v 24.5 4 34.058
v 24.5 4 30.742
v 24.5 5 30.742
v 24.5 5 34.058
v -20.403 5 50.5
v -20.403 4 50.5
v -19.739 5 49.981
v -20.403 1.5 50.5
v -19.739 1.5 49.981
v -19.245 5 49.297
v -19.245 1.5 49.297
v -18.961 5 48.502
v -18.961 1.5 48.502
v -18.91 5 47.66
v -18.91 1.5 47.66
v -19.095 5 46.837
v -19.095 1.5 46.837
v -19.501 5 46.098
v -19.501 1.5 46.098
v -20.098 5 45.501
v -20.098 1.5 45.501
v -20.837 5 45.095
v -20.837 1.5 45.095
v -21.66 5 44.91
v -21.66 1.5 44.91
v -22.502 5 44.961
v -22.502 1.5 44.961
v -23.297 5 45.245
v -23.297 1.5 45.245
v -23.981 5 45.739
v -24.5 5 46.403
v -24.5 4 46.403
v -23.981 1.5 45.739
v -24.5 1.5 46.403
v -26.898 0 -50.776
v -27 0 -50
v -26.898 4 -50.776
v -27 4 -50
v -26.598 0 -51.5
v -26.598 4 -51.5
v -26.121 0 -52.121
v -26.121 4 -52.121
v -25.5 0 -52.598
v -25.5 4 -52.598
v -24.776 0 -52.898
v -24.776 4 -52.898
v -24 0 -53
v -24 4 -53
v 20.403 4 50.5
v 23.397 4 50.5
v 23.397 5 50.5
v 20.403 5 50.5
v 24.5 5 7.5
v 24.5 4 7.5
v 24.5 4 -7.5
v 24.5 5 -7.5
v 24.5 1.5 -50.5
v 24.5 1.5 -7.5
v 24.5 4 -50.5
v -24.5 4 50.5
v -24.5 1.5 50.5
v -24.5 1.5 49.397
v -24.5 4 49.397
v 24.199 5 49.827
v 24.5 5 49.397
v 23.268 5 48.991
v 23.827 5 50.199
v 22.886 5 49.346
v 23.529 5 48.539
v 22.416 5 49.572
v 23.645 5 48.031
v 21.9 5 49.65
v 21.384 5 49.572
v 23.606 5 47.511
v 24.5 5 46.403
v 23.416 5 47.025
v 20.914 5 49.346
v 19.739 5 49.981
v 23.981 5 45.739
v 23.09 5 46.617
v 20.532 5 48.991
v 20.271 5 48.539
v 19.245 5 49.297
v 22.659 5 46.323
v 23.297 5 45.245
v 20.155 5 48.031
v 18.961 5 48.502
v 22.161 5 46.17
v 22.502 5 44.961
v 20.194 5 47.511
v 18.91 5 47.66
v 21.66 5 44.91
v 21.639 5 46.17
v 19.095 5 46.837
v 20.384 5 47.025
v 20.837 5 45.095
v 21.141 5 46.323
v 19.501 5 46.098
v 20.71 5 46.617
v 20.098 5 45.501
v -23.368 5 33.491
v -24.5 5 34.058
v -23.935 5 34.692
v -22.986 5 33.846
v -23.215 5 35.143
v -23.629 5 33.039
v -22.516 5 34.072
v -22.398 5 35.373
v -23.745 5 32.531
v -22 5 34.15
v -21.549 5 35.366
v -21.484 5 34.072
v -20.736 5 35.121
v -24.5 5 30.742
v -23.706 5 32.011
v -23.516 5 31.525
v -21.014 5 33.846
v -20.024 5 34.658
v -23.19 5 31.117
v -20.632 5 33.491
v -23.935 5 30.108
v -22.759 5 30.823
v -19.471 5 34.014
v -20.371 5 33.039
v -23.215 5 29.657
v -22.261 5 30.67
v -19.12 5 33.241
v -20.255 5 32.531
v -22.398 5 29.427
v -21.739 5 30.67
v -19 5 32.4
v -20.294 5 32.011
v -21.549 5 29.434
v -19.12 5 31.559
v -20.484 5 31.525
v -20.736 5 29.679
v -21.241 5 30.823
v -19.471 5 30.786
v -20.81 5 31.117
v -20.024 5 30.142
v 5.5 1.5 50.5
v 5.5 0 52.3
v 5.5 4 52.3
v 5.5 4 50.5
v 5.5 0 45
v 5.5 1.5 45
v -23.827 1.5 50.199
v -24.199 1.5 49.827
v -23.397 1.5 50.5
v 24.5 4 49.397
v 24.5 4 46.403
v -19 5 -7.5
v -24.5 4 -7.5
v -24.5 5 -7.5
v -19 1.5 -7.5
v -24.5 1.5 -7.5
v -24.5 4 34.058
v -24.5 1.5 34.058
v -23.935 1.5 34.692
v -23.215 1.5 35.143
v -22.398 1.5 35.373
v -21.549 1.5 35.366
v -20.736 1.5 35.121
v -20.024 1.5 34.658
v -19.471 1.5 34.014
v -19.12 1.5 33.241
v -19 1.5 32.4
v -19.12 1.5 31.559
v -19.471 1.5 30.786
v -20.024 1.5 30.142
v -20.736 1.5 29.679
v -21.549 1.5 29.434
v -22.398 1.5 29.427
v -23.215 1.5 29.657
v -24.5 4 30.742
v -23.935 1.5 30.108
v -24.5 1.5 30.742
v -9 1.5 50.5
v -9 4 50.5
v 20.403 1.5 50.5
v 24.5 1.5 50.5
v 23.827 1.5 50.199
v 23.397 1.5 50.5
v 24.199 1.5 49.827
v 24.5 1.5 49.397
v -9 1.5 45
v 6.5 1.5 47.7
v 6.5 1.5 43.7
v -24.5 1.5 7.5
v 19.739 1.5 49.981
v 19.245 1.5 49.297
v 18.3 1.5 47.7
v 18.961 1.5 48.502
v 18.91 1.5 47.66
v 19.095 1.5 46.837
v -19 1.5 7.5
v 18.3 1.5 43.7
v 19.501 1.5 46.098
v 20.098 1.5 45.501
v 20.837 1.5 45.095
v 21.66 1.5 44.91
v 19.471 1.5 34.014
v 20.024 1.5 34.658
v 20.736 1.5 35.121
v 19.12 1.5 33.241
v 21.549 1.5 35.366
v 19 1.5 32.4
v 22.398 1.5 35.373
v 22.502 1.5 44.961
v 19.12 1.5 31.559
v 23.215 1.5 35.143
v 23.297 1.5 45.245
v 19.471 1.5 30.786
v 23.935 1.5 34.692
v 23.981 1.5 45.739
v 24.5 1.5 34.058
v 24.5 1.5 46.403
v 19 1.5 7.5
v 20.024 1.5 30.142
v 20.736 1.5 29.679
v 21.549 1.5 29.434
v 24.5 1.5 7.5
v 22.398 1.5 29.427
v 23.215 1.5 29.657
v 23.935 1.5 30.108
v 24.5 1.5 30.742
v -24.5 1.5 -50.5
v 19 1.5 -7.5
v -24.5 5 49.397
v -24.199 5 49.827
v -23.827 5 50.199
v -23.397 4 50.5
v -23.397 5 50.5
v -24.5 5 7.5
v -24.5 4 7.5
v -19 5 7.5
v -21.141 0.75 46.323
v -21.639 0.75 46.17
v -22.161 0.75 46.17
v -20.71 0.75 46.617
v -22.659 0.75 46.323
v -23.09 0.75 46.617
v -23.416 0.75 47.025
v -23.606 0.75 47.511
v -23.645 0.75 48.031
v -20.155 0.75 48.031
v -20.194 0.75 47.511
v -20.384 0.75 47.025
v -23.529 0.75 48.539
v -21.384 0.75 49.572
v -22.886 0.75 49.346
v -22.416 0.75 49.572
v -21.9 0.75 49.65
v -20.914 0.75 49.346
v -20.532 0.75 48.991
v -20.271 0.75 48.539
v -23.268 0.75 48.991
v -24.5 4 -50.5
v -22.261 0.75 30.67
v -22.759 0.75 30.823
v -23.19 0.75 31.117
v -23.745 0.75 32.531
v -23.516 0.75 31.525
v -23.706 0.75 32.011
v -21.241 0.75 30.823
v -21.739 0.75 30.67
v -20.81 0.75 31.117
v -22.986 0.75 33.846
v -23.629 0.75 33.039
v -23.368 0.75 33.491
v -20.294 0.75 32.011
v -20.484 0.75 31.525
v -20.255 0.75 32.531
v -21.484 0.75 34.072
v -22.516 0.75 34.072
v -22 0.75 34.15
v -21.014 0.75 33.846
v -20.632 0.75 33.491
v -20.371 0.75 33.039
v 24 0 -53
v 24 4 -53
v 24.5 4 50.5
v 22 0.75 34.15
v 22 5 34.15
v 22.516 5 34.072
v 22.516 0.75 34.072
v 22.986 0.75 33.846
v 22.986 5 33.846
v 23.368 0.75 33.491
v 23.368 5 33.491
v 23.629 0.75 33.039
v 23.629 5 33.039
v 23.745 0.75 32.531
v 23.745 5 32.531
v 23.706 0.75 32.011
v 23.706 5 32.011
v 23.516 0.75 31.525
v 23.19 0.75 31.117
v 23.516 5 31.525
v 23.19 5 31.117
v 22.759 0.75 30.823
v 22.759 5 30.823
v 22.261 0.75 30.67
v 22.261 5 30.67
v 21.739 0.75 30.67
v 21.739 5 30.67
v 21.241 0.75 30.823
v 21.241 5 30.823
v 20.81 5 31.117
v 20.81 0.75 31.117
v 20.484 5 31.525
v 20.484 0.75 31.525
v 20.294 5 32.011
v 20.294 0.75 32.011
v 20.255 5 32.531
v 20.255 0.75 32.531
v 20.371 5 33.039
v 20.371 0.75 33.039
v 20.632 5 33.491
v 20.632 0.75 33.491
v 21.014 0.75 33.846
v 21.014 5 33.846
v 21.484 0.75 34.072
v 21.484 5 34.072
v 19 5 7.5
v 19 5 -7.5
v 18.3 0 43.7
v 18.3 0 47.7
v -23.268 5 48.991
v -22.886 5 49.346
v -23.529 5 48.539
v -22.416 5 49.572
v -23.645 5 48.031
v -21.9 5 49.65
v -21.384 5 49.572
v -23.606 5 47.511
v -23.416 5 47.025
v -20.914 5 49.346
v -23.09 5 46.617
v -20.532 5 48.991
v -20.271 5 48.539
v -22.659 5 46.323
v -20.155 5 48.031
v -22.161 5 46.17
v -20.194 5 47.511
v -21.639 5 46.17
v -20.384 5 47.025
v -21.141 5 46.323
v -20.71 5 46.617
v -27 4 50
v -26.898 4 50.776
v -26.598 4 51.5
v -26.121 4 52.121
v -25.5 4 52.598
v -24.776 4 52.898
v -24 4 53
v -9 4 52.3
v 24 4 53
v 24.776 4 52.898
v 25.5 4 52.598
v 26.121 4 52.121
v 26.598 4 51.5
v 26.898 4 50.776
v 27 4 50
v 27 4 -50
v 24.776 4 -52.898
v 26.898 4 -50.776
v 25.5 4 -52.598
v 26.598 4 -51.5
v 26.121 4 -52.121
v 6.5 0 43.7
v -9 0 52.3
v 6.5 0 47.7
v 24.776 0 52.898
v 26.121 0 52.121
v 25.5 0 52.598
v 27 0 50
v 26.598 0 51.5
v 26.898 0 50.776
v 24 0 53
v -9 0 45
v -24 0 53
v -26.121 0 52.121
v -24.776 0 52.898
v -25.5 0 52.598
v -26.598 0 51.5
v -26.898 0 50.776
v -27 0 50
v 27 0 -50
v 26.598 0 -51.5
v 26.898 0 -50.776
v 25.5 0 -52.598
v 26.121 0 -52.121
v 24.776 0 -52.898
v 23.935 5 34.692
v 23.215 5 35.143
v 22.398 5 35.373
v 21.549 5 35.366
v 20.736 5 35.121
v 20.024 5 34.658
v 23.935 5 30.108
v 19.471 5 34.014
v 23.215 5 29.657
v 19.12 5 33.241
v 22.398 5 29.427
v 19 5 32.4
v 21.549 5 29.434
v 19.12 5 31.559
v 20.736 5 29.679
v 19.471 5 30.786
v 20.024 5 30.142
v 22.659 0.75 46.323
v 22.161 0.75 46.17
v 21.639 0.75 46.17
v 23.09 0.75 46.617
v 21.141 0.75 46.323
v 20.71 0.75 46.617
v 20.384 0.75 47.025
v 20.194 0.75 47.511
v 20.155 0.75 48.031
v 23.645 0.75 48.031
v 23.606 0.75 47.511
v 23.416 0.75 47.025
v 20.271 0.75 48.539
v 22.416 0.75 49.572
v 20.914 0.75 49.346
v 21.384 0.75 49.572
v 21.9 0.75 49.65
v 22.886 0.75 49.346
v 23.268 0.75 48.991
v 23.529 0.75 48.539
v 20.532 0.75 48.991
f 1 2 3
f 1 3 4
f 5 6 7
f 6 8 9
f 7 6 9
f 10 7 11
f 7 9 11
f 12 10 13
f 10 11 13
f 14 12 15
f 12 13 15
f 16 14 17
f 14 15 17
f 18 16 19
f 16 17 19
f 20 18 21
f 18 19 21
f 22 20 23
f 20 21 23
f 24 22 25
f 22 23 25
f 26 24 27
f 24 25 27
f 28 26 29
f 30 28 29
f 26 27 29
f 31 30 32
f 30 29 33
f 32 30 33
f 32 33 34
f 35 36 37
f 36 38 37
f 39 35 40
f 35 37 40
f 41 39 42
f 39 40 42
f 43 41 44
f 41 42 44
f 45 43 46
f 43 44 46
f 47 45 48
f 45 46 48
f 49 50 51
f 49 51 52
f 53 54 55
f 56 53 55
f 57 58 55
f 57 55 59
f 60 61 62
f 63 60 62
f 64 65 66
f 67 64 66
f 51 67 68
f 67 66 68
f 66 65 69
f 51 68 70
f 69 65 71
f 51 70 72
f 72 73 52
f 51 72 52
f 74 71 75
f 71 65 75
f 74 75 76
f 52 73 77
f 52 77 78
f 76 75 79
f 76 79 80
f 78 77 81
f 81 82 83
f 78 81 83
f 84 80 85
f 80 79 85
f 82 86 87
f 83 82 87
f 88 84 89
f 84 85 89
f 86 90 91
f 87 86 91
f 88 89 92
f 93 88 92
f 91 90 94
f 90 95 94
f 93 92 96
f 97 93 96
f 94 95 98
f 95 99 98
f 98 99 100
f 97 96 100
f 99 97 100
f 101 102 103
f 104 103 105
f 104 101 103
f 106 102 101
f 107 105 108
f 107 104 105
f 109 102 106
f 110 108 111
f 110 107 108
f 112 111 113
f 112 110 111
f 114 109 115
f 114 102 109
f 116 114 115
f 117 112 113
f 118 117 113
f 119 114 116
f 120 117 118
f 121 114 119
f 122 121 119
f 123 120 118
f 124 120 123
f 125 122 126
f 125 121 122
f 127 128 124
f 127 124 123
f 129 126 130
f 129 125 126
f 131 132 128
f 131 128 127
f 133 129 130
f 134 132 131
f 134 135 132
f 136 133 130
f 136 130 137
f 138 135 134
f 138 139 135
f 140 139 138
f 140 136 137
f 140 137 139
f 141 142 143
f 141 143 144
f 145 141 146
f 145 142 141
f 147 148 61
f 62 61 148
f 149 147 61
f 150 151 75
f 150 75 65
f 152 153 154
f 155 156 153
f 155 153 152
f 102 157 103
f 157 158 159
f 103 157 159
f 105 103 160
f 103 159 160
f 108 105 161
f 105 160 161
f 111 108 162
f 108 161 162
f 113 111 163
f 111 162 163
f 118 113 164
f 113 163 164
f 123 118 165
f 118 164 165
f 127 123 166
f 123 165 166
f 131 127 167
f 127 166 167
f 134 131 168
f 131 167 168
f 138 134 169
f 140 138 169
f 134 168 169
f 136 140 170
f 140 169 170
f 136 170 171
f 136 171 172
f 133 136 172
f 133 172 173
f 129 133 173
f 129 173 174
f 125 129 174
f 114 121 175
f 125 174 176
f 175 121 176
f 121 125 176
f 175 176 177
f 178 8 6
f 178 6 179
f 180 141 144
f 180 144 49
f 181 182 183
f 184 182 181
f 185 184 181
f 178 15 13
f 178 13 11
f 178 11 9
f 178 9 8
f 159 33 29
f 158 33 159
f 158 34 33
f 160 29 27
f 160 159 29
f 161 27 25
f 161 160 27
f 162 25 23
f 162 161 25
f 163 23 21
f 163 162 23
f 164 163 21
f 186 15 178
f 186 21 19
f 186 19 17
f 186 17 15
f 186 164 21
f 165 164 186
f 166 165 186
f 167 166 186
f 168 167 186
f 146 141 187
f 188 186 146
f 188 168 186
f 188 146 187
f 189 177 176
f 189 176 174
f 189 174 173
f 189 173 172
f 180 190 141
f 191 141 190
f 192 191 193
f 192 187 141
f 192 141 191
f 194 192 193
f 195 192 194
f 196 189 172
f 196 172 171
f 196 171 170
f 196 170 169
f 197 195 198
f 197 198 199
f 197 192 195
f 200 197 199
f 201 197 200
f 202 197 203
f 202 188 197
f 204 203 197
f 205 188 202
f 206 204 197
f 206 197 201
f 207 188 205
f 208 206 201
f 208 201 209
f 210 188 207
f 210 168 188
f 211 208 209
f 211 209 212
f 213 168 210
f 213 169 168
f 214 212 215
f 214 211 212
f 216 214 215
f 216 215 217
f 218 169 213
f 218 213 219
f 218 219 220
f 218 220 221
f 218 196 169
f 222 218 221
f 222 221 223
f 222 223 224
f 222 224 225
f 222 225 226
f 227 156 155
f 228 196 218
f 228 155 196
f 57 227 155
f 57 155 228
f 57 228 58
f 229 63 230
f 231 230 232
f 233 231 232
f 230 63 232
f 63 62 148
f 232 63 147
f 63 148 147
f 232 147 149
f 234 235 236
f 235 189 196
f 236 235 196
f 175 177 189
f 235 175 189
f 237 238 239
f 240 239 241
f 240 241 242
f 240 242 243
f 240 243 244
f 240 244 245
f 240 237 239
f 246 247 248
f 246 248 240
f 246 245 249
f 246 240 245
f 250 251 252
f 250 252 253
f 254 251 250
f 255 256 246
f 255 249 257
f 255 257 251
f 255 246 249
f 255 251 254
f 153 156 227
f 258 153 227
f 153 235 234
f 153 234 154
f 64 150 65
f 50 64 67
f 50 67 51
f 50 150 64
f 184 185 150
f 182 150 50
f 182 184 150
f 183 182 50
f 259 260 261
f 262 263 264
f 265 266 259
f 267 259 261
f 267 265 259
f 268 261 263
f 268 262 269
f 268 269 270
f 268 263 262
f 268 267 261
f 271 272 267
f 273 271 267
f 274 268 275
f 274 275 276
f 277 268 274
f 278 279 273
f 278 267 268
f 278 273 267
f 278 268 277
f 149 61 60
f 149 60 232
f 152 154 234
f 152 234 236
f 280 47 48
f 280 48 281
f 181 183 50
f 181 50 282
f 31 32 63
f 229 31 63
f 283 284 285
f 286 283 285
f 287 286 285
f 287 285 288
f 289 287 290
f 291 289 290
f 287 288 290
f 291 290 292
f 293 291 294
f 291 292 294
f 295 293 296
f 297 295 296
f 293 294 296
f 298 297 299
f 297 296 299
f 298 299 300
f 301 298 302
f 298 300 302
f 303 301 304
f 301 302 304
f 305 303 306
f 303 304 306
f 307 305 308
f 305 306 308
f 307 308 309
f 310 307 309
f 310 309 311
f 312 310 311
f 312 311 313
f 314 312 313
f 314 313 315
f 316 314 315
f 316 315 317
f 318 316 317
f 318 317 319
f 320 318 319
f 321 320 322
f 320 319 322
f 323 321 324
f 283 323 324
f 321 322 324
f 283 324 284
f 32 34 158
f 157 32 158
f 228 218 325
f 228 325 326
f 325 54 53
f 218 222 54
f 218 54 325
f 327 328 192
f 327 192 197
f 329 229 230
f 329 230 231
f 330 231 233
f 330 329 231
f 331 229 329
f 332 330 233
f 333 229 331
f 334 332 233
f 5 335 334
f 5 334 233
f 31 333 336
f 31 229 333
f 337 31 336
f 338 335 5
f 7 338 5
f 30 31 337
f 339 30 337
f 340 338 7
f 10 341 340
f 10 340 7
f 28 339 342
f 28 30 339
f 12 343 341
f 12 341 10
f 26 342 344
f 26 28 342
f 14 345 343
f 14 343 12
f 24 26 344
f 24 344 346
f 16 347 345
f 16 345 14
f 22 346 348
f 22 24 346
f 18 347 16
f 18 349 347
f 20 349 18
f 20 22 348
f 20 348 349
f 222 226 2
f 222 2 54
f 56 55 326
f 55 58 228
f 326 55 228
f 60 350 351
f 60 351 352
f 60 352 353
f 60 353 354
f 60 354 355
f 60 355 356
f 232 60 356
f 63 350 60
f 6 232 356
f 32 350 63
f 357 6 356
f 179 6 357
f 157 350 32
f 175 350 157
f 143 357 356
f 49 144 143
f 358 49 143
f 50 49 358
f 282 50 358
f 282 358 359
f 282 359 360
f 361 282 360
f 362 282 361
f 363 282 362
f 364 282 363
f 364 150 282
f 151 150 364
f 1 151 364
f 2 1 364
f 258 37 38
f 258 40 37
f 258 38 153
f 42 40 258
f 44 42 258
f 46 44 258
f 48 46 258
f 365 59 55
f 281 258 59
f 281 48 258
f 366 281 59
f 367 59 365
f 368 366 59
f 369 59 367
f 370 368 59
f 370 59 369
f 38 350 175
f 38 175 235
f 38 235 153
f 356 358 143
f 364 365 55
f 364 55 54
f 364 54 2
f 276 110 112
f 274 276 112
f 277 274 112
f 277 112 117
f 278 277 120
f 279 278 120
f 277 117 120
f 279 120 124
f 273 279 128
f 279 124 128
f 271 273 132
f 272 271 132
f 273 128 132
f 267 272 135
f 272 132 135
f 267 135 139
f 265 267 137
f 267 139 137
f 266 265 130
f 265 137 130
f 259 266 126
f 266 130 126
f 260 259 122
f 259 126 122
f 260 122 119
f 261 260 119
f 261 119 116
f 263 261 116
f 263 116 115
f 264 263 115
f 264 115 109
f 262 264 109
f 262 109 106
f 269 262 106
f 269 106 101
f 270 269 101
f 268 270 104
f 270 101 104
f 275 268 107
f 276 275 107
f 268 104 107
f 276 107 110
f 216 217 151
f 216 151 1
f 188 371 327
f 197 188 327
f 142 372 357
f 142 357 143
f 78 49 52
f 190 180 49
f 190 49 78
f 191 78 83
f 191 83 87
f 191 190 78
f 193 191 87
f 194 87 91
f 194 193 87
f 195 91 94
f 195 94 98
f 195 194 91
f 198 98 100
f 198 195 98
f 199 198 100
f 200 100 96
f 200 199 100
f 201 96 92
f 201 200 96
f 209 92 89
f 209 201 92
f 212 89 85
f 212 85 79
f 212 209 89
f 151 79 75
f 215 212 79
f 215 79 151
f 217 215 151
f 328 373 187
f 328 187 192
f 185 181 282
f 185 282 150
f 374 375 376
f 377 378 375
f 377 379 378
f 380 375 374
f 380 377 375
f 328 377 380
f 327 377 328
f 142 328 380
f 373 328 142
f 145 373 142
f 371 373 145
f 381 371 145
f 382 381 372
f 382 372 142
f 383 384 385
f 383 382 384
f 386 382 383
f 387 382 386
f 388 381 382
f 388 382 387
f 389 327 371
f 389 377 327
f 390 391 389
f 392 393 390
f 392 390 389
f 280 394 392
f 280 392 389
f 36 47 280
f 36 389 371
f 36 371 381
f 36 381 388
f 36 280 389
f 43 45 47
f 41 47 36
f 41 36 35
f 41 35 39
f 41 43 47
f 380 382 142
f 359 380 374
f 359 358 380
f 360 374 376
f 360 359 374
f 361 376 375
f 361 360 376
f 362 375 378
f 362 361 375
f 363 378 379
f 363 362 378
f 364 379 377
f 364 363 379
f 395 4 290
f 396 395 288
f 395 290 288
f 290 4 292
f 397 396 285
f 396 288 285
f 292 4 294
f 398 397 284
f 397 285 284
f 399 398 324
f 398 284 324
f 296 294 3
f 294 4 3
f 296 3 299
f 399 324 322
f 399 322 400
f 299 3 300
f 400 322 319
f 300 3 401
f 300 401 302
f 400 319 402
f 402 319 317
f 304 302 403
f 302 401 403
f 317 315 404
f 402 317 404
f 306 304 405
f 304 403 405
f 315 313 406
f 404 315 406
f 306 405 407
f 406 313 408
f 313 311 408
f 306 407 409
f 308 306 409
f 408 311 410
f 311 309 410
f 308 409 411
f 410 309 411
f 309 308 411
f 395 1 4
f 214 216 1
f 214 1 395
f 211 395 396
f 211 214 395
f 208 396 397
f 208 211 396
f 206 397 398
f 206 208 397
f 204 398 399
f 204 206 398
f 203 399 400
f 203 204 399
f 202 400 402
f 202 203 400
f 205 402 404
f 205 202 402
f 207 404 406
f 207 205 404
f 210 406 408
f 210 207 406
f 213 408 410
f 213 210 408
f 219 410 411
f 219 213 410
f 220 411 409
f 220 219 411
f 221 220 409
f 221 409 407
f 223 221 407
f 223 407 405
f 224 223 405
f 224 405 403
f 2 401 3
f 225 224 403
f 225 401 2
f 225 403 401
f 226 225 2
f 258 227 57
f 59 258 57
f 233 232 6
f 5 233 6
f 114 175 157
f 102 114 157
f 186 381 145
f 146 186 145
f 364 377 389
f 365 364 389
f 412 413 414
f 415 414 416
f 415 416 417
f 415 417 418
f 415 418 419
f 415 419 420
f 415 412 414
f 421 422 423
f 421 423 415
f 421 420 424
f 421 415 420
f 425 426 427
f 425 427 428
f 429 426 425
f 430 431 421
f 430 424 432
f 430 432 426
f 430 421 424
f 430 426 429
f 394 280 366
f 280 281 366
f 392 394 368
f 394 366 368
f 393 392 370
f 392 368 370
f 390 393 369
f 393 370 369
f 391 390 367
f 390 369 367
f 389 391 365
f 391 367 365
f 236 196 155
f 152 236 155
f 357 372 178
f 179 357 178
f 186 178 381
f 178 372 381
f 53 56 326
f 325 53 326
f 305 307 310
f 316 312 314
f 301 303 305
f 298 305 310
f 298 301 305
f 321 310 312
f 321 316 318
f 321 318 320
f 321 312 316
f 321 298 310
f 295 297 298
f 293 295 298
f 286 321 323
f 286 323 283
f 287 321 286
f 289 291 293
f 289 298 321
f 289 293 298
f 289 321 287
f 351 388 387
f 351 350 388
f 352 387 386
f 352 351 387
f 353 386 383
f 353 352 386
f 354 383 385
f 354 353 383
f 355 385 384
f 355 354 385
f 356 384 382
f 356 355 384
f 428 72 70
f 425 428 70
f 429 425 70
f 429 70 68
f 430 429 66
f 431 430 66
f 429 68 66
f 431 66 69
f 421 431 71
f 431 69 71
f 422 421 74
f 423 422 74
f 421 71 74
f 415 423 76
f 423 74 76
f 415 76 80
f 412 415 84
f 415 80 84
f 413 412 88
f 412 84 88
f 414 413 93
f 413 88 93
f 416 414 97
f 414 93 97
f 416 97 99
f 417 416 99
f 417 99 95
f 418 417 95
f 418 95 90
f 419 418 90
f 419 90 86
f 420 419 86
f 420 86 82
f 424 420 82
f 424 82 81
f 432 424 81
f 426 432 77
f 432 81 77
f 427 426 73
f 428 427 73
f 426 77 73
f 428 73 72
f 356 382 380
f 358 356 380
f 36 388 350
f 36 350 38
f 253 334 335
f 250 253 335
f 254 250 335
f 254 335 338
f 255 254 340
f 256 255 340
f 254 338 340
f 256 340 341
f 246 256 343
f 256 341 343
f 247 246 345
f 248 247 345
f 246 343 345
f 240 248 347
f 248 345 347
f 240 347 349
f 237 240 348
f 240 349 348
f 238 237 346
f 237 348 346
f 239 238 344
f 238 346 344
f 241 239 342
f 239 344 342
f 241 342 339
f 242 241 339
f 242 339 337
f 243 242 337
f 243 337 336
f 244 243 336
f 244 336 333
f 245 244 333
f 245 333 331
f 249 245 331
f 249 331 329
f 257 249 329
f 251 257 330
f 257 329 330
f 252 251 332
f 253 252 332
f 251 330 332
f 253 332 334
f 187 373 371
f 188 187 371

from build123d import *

# Parameters (mm, degrees)
SKETCH1_W           = 49
SKETCH1_H           = 101
BOSS_EXTRUDE1_DEPTH = 1.5
SKETCH2_W           = 54
SKETCH2_H           = 106
SKETCH2_W_2         = 49
SKETCH2_H_2         = 101
BOSS_EXTRUDE2_DEPTH = 4
SKETCH3_W           = 5.5
SKETCH3_H           = 15
BOSS_EXTRUDE3_DEPTH = 5
SKETCH4_R           = 1.75
CUT_EXTRUDE1_DEPTH  = 4.25
SKETCH5_R           = 1.75
CUT_EXTRUDE2_DEPTH  = 4.25
SKETCH6_W           = 14.5
SKETCH6_H           = 7.3
CUT_EXTRUDE3_DEPTH  = 60.690870324
SKETCH7_W           = 11.8
SKETCH7_H           = 4
CUT_EXTRUDE4_DEPTH  = 60.690870324
FILLET1_R           = 3


with BuildPart() as part:
    # Sketch1 → Boss-Extrude1 (new body)
    with BuildSketch(Plane(origin=(0, 0, 0), x_dir=(1, 0, 0), z_dir=(0, 1, 0))):
        Rectangle(SKETCH1_W, SKETCH1_H)
    extrude(amount=BOSS_EXTRUDE1_DEPTH)

    # Sketch2 → Boss-Extrude2 (add)
    with BuildSketch(Plane(origin=(0, 0, 0), x_dir=(1, 0, 0), z_dir=(0, 1, 0))):
        Rectangle(SKETCH2_W, SKETCH2_H)
        Rectangle(SKETCH2_W_2, SKETCH2_H_2, mode=Mode.SUBTRACT)
    extrude(amount=BOSS_EXTRUDE2_DEPTH)

    # Sketch3 → Boss-Extrude3 (add)
    with BuildSketch(Plane(origin=(0, 0, 0), x_dir=(1, 0, 0), z_dir=(0, 1, 0))):
        with BuildLine():
            Line((-24.5, -30.741687605), (-24.5, -34.058312395))
            ThreePointArc((-24.5, -34.058312395), (-19, -32.4), (-24.5, -30.741687605))
        make_face()
        with Locations((-21.75, 0)):
            Rectangle(SKETCH3_W, SKETCH3_H)
        with BuildLine():
            Line((-24.5, -46.403337045), (-24.5, -49.396662955))
            ThreePointArc((-24.5, -49.396662955), (-24.021320344, -50.021320344), (-23.396662955, -50.5))
            Line((-23.396662955, -50.5), (-20.403337045, -50.5))
            ThreePointArc((-20.403337045, -50.5), (-19.778679656, -45.778679656), (-24.5, -46.403337045))
        make_face()
    boss_extrude3 = extrude(amount=BOSS_EXTRUDE3_DEPTH)

    # Mirror1: Boss-Extrude3 across plane
    add(boss_extrude3.mirror(Plane(origin=(0, 0, 0), x_dir=(0, 0, 1), z_dir=(1, 0, 0))))

    # Sketch4 → Cut-Extrude1 (cut)
    with BuildSketch(Plane(origin=(0, 5, 0), x_dir=(1, 0, 0), z_dir=(0, 1, 0))):
        with Locations(Location((-21.9, -47.9, 0), (0, 0, 270))):
            Circle(SKETCH4_R)
        with Locations(Location((21.9, -47.9, 0), (0, 0, 270))):
            Circle(SKETCH4_R)
    extrude(amount=-CUT_EXTRUDE1_DEPTH, mode=Mode.SUBTRACT)

    # Sketch5 → Cut-Extrude2 (cut)
    with BuildSketch(Plane(origin=(0, 5, 0), x_dir=(1, 0, 0), z_dir=(0, 1, 0))):
        with Locations(Location((-22, -32.4, 0), (0, 0, 270))):
            Circle(SKETCH5_R)
        with Locations(Location((22, -32.4, 0), (0, 0, 270))):
            Circle(SKETCH5_R)
    extrude(amount=-CUT_EXTRUDE2_DEPTH, mode=Mode.SUBTRACT)

    # Sketch6 → Cut-Extrude3 (cut, through all)
    with BuildSketch(Plane(origin=(0, 0, 0), x_dir=(1, 0, 0), z_dir=(0, 1, 0))):
        with Locations((-1.75, -48.65)):
            Rectangle(SKETCH6_W, SKETCH6_H)
    extrude(amount=CUT_EXTRUDE3_DEPTH, mode=Mode.SUBTRACT)

    # Sketch7 → Cut-Extrude4 (cut, through all)
    with BuildSketch(Plane(origin=(0, 0, 0), x_dir=(1, 0, 0), z_dir=(0, 1, 0))):
        with Locations((12.4, -45.7)):
            Rectangle(SKETCH7_W, SKETCH7_H)
    extrude(amount=CUT_EXTRUDE4_DEPTH, mode=Mode.SUBTRACT)

    # Fillet1
    fillet1_edges = [part.edges().sort_by_distance(p)[0] for p in [
        (-27, 2, 53),
        (27, 2, 53),
        (27, 2, -53),
        (-27, 2, -53),
    ]]
    fillet(fillet1_edges, radius=FILLET1_R)


solid = part.part
